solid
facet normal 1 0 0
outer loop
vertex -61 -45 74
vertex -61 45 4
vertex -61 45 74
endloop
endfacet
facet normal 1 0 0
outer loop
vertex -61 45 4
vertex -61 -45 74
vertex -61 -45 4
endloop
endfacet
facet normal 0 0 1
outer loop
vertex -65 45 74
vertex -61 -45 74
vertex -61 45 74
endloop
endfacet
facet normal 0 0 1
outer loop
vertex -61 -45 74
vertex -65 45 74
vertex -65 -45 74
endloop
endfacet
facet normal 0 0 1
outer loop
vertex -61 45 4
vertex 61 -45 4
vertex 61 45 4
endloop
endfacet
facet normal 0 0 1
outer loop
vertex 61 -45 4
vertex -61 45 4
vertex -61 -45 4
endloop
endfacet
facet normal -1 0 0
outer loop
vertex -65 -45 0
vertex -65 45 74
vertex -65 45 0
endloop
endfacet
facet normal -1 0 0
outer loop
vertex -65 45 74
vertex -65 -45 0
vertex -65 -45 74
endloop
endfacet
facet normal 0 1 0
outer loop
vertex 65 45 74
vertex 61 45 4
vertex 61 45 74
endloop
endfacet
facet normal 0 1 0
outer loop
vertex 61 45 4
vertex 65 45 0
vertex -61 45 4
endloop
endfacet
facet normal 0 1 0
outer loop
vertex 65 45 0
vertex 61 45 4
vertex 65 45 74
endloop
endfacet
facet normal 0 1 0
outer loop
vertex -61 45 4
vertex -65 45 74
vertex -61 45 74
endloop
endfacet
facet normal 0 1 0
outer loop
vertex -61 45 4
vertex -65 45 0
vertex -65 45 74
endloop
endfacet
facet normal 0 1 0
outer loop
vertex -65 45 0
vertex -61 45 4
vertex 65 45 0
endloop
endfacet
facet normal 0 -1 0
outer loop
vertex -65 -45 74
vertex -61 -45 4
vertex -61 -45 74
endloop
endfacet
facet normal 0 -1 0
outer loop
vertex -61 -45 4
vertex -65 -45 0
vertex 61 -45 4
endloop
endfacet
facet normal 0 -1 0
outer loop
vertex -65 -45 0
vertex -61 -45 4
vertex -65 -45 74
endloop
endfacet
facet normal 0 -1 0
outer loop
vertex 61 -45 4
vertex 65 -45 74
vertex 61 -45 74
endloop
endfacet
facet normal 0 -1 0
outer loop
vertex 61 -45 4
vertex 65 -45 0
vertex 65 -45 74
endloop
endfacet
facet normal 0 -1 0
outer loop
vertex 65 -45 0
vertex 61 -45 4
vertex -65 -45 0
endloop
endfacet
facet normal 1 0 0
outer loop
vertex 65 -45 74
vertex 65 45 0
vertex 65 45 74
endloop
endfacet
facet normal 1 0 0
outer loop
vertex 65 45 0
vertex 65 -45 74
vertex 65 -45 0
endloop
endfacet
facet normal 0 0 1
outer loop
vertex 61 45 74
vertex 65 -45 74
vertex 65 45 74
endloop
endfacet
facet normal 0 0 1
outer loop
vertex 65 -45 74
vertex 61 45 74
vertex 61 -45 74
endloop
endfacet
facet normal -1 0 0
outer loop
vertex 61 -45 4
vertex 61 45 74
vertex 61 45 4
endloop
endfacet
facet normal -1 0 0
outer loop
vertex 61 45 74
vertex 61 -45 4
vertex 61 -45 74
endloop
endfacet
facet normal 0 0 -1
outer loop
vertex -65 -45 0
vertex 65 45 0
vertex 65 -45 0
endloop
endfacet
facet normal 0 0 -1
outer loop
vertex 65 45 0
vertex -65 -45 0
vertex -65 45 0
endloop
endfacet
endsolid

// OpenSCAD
// Rack for six 50 mL conical (Falcon-type) tubes
// Print orientation: flat plate on bed, walls rising to z = 70.
// After printing, flip the part so the walls stand on the bed and the
// tube holes face upward.
//
// Units: mm. $fn = 64 for round holes.

// ---------------- Parameters ----------------
plate_x      = 130;   // plate length along X
plate_y      = 90;    // plate width along Y
plate_t      = 4;     // plate thickness (z = 0 to 4)

hole_d       = 30.5;  // through-hole diameter
hole_count   = 6;     // number of tube holes
hole_pitch   = 40;    // centre-to-centre spacing (both X and Y)
hole_start_x = -65;   // first hole X (3 holes over 130 mm)
hole_start_y = -45;   // first hole Y (2 rows along Y)

wall_t       = 4;     // wall thickness (Y)
wall_h       = 70;    // wall top height (z = plate_t to 74)

eps          = 0.5;   // cutter overshoot past faces

$fn = 64;

// ---------------- Model ----------------
union() {
    // Flat base plate
    translate([-plate_x/2, -plate_y/2, 0])
        cube([plate_x, plate_y, plate_t]);

    // Two solid walls along the long edges (flush with plate's long edge)
    for (sx = [-1, 1])
        translate([sx > 0 ? plate_x/2 - wall_t : -plate_x/2,
                   -plate_y/2, plate_t])
            cube([wall_t, plate_y, wall_h]);
}

// ---------------- Tube holes ----------------
// Drilled while in print orientation; after flipping they face upward.
difference() {
    // (Copy of the rack body to keep a clean module structure)
    union() {
        translate([-plate_x/2, -plate_y/2, 0])
            cube([plate_x, plate_y, plate_t]);
        for (sx = [-1, 1])
            translate([sx > 0 ? plate_x/2 - wall_t : -plate_x/2,
                       -plate_y/2, plate_t])
                cube([wall_t, plate_y, wall_h]);
    }

    for (i = [0 : hole_count - 1]) {
        x = hole_start_x + i % 3 * hole_pitch;
        y = hole_start_y + floor(i / 3) * hole_pitch;
        translate([x, y, -eps])
            cylinder(d = hole_d, h = plate_t + 2*eps);
    }
}
